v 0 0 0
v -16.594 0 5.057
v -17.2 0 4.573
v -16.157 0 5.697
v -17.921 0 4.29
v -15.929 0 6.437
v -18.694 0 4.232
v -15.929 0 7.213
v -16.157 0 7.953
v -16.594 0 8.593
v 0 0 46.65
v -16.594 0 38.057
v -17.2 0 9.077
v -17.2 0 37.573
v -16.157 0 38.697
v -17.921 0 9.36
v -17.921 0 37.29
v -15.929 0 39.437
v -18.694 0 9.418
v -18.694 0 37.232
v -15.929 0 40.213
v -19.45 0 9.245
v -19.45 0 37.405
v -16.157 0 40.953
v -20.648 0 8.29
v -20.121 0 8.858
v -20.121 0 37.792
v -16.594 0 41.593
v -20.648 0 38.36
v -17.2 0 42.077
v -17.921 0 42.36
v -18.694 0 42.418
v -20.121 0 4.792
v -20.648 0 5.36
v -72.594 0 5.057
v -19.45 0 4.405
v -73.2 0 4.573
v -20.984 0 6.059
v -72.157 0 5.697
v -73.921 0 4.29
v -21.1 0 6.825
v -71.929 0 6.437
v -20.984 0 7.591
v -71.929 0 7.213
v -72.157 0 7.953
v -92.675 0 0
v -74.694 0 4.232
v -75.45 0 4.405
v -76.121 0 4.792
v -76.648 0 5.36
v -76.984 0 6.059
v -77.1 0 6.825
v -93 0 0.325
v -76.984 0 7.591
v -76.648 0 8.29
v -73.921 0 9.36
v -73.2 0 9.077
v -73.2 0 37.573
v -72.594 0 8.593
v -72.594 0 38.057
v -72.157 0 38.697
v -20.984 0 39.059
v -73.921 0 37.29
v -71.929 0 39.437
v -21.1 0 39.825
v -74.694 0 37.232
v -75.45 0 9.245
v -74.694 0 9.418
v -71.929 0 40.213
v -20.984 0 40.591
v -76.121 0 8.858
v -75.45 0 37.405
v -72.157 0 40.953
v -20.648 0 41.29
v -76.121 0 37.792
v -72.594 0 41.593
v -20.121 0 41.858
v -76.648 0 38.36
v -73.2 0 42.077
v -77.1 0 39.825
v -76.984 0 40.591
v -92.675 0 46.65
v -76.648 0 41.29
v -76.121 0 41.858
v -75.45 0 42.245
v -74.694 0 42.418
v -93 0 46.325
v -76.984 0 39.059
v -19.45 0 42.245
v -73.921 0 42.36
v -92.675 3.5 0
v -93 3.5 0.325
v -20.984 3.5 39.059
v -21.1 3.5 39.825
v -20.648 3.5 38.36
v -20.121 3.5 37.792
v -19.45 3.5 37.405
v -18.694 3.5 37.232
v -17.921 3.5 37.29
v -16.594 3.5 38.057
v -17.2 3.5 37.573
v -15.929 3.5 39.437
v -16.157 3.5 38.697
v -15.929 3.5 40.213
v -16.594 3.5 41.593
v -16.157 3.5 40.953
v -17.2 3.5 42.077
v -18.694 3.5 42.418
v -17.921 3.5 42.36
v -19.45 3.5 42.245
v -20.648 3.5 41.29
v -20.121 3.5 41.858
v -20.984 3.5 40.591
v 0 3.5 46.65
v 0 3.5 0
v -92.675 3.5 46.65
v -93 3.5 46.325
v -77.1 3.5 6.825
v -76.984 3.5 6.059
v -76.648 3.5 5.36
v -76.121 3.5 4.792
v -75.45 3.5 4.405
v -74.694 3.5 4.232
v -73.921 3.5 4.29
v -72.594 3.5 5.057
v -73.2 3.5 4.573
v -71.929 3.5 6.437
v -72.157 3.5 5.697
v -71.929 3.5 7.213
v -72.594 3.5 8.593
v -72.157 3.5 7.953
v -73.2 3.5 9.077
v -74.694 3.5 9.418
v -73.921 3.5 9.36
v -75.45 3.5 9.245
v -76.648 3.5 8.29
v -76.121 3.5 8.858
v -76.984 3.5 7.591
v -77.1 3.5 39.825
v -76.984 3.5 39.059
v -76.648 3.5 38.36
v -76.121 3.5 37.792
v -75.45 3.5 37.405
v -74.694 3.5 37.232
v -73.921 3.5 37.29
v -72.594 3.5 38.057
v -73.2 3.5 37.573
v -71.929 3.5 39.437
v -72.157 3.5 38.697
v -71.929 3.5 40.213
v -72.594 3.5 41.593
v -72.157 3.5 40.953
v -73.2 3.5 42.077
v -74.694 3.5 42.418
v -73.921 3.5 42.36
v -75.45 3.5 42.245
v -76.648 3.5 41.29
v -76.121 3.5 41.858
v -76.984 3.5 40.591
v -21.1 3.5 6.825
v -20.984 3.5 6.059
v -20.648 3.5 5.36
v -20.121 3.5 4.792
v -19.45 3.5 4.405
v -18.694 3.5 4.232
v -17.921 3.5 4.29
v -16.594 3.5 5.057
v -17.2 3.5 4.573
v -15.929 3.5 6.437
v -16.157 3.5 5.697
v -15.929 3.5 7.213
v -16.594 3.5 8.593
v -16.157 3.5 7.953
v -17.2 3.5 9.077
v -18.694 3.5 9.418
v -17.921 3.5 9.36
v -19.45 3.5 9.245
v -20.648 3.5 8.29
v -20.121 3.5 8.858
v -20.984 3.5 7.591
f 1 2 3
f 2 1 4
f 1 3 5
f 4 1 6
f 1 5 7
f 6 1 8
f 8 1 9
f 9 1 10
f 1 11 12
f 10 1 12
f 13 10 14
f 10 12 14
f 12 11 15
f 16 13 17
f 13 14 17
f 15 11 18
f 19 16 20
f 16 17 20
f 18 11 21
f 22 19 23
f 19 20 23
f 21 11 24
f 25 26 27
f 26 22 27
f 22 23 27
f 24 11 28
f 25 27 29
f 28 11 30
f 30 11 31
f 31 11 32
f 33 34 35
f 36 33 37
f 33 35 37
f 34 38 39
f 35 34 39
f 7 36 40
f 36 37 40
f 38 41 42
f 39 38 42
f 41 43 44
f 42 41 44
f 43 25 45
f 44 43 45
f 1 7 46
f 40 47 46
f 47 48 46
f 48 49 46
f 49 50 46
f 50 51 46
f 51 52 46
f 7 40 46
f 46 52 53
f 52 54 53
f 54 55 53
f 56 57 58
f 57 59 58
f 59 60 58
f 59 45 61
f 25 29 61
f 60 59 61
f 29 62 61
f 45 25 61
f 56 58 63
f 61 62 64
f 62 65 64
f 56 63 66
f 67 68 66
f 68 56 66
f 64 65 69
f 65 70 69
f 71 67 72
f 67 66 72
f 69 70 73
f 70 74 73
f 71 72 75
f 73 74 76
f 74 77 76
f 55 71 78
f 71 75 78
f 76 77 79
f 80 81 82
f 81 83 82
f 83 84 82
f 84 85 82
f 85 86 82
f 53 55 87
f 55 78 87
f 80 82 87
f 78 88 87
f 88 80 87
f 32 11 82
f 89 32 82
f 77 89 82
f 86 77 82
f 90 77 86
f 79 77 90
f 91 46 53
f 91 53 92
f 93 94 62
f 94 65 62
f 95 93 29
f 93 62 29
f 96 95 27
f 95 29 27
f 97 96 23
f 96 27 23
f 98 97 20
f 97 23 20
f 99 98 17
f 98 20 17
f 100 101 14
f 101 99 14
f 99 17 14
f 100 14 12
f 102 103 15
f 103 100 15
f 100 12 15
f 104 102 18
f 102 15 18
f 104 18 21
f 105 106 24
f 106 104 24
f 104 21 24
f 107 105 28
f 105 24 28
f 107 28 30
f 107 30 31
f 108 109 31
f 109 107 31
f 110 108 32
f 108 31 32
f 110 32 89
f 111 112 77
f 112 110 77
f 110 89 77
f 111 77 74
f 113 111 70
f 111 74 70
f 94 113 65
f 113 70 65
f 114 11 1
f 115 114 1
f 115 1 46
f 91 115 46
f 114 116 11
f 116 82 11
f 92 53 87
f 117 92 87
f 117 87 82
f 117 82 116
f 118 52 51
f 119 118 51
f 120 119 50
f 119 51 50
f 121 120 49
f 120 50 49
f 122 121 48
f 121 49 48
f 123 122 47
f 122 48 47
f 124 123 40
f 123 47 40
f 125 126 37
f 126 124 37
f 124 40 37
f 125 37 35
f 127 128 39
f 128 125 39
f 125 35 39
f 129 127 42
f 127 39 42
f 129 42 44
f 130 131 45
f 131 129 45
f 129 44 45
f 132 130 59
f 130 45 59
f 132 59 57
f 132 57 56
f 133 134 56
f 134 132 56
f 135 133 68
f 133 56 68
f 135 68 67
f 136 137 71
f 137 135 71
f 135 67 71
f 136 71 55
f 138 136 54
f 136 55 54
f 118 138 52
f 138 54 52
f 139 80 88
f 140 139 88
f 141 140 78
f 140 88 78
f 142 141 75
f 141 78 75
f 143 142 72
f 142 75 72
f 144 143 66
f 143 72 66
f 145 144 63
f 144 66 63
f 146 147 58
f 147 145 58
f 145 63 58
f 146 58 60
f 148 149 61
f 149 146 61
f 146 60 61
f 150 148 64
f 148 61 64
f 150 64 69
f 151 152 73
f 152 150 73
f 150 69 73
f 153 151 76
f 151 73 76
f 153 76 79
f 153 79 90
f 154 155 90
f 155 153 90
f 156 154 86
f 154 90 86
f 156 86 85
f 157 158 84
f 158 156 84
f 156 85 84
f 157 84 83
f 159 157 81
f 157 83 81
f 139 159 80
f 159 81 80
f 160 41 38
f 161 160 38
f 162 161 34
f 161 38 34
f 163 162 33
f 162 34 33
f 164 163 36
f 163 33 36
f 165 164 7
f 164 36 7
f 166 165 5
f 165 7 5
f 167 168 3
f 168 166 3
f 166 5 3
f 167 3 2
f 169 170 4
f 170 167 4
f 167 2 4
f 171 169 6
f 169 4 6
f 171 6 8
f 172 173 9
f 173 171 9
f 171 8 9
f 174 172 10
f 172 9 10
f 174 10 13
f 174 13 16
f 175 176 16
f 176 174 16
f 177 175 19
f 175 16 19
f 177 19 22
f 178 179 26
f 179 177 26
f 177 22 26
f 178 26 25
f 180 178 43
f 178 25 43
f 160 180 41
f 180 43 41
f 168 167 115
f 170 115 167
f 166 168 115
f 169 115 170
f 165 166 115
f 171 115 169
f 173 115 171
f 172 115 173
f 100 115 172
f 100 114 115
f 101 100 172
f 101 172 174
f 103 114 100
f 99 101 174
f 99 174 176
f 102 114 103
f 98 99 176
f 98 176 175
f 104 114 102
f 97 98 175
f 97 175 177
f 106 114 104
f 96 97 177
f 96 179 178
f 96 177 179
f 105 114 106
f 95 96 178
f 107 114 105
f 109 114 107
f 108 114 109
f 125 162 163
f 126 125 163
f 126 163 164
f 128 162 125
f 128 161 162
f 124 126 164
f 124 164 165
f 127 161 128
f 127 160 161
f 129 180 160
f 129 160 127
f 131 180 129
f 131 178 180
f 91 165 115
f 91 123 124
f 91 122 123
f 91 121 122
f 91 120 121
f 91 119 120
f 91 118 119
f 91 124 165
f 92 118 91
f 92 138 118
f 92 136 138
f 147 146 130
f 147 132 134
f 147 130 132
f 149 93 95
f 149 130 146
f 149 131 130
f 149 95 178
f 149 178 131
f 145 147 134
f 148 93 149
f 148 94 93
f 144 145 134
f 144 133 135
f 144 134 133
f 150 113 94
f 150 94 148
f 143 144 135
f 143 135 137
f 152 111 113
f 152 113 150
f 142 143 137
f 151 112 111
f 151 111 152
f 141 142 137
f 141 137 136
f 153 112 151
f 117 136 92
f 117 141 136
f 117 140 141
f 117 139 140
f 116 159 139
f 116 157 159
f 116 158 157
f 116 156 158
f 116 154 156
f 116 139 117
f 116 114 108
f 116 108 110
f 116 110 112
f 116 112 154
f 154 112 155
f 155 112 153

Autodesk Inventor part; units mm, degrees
ref_plane "YZ Plane" through (0, 0, 0) normal (1, 0, 0) x (0, 1, 0)
ref_plane "XZ Plane" through (0, 0, 0) normal (0, 1, 0) x (-1, 0, 0)
ref_plane "XY Plane" through (0, 0, 0) normal (0, 0, 1) x (1, 0, 0)
sketch "Sketch1" plane through (0, 0, 0) normal (0, 1, 0) x (-1, 0, 0)
  line L0 (0, 0) -> (93, 0)
  line L1 (93, 0) -> (93, 46.65)
  line L2 (93, 46.65) -> (0, 46.65)
  line L3 (0, 46.65) -> (0, 0)
  line L4 (74.5, 39.825) -> (18.5, 39.825) construction
  line L5 (18.5, 39.825) -> (18.5, 6.825) construction
  line L6 (18.5, 6.825) -> (74.5, 6.825) construction
  line L7 (74.5, 6.825) -> (74.5, 39.825) construction
  line L8 (74.5, 39.825) -> (93, 39.825) construction
  line L9 (74.5, 39.825) -> (74.5, 46.65) construction
  line L10 (18.5, 6.825) -> (18.5, 0) construction
  line L11 (18.5, 6.825) -> (0, 6.825) construction
  circle A0 centre (74.5, 39.825) radius 2.6
  circle A1 centre (74.5, 6.825) radius 2.6
  circle A2 centre (18.5, 6.825) radius 2.6
  circle A3 centre (18.5, 39.825) radius 2.6
  dimension "d0" = 46.65
  dimension "d1" = 93
  dimension "d2" = 33
  dimension "d3" = 56
  dimension "d4" = 5.2
  dimension "d5" = 5.2
  dimension "d6" = 5.2
  dimension "d7" = 5.2
extrude "Extrusion1" add sketch "Sketch1" along normal blind 3.5
chamfer "Chamfer1" distance 0.325 angle 45 2 edges at (-93, 1.75, 46.65) (-93, 1.75, 0)
equation "\"d5\" = d4"
equation "\"d6\" = d4"
equation "\"d7\" = d4"
properties part number "X Axis Belt Tentoner NON ADJUSTABLE Top"
